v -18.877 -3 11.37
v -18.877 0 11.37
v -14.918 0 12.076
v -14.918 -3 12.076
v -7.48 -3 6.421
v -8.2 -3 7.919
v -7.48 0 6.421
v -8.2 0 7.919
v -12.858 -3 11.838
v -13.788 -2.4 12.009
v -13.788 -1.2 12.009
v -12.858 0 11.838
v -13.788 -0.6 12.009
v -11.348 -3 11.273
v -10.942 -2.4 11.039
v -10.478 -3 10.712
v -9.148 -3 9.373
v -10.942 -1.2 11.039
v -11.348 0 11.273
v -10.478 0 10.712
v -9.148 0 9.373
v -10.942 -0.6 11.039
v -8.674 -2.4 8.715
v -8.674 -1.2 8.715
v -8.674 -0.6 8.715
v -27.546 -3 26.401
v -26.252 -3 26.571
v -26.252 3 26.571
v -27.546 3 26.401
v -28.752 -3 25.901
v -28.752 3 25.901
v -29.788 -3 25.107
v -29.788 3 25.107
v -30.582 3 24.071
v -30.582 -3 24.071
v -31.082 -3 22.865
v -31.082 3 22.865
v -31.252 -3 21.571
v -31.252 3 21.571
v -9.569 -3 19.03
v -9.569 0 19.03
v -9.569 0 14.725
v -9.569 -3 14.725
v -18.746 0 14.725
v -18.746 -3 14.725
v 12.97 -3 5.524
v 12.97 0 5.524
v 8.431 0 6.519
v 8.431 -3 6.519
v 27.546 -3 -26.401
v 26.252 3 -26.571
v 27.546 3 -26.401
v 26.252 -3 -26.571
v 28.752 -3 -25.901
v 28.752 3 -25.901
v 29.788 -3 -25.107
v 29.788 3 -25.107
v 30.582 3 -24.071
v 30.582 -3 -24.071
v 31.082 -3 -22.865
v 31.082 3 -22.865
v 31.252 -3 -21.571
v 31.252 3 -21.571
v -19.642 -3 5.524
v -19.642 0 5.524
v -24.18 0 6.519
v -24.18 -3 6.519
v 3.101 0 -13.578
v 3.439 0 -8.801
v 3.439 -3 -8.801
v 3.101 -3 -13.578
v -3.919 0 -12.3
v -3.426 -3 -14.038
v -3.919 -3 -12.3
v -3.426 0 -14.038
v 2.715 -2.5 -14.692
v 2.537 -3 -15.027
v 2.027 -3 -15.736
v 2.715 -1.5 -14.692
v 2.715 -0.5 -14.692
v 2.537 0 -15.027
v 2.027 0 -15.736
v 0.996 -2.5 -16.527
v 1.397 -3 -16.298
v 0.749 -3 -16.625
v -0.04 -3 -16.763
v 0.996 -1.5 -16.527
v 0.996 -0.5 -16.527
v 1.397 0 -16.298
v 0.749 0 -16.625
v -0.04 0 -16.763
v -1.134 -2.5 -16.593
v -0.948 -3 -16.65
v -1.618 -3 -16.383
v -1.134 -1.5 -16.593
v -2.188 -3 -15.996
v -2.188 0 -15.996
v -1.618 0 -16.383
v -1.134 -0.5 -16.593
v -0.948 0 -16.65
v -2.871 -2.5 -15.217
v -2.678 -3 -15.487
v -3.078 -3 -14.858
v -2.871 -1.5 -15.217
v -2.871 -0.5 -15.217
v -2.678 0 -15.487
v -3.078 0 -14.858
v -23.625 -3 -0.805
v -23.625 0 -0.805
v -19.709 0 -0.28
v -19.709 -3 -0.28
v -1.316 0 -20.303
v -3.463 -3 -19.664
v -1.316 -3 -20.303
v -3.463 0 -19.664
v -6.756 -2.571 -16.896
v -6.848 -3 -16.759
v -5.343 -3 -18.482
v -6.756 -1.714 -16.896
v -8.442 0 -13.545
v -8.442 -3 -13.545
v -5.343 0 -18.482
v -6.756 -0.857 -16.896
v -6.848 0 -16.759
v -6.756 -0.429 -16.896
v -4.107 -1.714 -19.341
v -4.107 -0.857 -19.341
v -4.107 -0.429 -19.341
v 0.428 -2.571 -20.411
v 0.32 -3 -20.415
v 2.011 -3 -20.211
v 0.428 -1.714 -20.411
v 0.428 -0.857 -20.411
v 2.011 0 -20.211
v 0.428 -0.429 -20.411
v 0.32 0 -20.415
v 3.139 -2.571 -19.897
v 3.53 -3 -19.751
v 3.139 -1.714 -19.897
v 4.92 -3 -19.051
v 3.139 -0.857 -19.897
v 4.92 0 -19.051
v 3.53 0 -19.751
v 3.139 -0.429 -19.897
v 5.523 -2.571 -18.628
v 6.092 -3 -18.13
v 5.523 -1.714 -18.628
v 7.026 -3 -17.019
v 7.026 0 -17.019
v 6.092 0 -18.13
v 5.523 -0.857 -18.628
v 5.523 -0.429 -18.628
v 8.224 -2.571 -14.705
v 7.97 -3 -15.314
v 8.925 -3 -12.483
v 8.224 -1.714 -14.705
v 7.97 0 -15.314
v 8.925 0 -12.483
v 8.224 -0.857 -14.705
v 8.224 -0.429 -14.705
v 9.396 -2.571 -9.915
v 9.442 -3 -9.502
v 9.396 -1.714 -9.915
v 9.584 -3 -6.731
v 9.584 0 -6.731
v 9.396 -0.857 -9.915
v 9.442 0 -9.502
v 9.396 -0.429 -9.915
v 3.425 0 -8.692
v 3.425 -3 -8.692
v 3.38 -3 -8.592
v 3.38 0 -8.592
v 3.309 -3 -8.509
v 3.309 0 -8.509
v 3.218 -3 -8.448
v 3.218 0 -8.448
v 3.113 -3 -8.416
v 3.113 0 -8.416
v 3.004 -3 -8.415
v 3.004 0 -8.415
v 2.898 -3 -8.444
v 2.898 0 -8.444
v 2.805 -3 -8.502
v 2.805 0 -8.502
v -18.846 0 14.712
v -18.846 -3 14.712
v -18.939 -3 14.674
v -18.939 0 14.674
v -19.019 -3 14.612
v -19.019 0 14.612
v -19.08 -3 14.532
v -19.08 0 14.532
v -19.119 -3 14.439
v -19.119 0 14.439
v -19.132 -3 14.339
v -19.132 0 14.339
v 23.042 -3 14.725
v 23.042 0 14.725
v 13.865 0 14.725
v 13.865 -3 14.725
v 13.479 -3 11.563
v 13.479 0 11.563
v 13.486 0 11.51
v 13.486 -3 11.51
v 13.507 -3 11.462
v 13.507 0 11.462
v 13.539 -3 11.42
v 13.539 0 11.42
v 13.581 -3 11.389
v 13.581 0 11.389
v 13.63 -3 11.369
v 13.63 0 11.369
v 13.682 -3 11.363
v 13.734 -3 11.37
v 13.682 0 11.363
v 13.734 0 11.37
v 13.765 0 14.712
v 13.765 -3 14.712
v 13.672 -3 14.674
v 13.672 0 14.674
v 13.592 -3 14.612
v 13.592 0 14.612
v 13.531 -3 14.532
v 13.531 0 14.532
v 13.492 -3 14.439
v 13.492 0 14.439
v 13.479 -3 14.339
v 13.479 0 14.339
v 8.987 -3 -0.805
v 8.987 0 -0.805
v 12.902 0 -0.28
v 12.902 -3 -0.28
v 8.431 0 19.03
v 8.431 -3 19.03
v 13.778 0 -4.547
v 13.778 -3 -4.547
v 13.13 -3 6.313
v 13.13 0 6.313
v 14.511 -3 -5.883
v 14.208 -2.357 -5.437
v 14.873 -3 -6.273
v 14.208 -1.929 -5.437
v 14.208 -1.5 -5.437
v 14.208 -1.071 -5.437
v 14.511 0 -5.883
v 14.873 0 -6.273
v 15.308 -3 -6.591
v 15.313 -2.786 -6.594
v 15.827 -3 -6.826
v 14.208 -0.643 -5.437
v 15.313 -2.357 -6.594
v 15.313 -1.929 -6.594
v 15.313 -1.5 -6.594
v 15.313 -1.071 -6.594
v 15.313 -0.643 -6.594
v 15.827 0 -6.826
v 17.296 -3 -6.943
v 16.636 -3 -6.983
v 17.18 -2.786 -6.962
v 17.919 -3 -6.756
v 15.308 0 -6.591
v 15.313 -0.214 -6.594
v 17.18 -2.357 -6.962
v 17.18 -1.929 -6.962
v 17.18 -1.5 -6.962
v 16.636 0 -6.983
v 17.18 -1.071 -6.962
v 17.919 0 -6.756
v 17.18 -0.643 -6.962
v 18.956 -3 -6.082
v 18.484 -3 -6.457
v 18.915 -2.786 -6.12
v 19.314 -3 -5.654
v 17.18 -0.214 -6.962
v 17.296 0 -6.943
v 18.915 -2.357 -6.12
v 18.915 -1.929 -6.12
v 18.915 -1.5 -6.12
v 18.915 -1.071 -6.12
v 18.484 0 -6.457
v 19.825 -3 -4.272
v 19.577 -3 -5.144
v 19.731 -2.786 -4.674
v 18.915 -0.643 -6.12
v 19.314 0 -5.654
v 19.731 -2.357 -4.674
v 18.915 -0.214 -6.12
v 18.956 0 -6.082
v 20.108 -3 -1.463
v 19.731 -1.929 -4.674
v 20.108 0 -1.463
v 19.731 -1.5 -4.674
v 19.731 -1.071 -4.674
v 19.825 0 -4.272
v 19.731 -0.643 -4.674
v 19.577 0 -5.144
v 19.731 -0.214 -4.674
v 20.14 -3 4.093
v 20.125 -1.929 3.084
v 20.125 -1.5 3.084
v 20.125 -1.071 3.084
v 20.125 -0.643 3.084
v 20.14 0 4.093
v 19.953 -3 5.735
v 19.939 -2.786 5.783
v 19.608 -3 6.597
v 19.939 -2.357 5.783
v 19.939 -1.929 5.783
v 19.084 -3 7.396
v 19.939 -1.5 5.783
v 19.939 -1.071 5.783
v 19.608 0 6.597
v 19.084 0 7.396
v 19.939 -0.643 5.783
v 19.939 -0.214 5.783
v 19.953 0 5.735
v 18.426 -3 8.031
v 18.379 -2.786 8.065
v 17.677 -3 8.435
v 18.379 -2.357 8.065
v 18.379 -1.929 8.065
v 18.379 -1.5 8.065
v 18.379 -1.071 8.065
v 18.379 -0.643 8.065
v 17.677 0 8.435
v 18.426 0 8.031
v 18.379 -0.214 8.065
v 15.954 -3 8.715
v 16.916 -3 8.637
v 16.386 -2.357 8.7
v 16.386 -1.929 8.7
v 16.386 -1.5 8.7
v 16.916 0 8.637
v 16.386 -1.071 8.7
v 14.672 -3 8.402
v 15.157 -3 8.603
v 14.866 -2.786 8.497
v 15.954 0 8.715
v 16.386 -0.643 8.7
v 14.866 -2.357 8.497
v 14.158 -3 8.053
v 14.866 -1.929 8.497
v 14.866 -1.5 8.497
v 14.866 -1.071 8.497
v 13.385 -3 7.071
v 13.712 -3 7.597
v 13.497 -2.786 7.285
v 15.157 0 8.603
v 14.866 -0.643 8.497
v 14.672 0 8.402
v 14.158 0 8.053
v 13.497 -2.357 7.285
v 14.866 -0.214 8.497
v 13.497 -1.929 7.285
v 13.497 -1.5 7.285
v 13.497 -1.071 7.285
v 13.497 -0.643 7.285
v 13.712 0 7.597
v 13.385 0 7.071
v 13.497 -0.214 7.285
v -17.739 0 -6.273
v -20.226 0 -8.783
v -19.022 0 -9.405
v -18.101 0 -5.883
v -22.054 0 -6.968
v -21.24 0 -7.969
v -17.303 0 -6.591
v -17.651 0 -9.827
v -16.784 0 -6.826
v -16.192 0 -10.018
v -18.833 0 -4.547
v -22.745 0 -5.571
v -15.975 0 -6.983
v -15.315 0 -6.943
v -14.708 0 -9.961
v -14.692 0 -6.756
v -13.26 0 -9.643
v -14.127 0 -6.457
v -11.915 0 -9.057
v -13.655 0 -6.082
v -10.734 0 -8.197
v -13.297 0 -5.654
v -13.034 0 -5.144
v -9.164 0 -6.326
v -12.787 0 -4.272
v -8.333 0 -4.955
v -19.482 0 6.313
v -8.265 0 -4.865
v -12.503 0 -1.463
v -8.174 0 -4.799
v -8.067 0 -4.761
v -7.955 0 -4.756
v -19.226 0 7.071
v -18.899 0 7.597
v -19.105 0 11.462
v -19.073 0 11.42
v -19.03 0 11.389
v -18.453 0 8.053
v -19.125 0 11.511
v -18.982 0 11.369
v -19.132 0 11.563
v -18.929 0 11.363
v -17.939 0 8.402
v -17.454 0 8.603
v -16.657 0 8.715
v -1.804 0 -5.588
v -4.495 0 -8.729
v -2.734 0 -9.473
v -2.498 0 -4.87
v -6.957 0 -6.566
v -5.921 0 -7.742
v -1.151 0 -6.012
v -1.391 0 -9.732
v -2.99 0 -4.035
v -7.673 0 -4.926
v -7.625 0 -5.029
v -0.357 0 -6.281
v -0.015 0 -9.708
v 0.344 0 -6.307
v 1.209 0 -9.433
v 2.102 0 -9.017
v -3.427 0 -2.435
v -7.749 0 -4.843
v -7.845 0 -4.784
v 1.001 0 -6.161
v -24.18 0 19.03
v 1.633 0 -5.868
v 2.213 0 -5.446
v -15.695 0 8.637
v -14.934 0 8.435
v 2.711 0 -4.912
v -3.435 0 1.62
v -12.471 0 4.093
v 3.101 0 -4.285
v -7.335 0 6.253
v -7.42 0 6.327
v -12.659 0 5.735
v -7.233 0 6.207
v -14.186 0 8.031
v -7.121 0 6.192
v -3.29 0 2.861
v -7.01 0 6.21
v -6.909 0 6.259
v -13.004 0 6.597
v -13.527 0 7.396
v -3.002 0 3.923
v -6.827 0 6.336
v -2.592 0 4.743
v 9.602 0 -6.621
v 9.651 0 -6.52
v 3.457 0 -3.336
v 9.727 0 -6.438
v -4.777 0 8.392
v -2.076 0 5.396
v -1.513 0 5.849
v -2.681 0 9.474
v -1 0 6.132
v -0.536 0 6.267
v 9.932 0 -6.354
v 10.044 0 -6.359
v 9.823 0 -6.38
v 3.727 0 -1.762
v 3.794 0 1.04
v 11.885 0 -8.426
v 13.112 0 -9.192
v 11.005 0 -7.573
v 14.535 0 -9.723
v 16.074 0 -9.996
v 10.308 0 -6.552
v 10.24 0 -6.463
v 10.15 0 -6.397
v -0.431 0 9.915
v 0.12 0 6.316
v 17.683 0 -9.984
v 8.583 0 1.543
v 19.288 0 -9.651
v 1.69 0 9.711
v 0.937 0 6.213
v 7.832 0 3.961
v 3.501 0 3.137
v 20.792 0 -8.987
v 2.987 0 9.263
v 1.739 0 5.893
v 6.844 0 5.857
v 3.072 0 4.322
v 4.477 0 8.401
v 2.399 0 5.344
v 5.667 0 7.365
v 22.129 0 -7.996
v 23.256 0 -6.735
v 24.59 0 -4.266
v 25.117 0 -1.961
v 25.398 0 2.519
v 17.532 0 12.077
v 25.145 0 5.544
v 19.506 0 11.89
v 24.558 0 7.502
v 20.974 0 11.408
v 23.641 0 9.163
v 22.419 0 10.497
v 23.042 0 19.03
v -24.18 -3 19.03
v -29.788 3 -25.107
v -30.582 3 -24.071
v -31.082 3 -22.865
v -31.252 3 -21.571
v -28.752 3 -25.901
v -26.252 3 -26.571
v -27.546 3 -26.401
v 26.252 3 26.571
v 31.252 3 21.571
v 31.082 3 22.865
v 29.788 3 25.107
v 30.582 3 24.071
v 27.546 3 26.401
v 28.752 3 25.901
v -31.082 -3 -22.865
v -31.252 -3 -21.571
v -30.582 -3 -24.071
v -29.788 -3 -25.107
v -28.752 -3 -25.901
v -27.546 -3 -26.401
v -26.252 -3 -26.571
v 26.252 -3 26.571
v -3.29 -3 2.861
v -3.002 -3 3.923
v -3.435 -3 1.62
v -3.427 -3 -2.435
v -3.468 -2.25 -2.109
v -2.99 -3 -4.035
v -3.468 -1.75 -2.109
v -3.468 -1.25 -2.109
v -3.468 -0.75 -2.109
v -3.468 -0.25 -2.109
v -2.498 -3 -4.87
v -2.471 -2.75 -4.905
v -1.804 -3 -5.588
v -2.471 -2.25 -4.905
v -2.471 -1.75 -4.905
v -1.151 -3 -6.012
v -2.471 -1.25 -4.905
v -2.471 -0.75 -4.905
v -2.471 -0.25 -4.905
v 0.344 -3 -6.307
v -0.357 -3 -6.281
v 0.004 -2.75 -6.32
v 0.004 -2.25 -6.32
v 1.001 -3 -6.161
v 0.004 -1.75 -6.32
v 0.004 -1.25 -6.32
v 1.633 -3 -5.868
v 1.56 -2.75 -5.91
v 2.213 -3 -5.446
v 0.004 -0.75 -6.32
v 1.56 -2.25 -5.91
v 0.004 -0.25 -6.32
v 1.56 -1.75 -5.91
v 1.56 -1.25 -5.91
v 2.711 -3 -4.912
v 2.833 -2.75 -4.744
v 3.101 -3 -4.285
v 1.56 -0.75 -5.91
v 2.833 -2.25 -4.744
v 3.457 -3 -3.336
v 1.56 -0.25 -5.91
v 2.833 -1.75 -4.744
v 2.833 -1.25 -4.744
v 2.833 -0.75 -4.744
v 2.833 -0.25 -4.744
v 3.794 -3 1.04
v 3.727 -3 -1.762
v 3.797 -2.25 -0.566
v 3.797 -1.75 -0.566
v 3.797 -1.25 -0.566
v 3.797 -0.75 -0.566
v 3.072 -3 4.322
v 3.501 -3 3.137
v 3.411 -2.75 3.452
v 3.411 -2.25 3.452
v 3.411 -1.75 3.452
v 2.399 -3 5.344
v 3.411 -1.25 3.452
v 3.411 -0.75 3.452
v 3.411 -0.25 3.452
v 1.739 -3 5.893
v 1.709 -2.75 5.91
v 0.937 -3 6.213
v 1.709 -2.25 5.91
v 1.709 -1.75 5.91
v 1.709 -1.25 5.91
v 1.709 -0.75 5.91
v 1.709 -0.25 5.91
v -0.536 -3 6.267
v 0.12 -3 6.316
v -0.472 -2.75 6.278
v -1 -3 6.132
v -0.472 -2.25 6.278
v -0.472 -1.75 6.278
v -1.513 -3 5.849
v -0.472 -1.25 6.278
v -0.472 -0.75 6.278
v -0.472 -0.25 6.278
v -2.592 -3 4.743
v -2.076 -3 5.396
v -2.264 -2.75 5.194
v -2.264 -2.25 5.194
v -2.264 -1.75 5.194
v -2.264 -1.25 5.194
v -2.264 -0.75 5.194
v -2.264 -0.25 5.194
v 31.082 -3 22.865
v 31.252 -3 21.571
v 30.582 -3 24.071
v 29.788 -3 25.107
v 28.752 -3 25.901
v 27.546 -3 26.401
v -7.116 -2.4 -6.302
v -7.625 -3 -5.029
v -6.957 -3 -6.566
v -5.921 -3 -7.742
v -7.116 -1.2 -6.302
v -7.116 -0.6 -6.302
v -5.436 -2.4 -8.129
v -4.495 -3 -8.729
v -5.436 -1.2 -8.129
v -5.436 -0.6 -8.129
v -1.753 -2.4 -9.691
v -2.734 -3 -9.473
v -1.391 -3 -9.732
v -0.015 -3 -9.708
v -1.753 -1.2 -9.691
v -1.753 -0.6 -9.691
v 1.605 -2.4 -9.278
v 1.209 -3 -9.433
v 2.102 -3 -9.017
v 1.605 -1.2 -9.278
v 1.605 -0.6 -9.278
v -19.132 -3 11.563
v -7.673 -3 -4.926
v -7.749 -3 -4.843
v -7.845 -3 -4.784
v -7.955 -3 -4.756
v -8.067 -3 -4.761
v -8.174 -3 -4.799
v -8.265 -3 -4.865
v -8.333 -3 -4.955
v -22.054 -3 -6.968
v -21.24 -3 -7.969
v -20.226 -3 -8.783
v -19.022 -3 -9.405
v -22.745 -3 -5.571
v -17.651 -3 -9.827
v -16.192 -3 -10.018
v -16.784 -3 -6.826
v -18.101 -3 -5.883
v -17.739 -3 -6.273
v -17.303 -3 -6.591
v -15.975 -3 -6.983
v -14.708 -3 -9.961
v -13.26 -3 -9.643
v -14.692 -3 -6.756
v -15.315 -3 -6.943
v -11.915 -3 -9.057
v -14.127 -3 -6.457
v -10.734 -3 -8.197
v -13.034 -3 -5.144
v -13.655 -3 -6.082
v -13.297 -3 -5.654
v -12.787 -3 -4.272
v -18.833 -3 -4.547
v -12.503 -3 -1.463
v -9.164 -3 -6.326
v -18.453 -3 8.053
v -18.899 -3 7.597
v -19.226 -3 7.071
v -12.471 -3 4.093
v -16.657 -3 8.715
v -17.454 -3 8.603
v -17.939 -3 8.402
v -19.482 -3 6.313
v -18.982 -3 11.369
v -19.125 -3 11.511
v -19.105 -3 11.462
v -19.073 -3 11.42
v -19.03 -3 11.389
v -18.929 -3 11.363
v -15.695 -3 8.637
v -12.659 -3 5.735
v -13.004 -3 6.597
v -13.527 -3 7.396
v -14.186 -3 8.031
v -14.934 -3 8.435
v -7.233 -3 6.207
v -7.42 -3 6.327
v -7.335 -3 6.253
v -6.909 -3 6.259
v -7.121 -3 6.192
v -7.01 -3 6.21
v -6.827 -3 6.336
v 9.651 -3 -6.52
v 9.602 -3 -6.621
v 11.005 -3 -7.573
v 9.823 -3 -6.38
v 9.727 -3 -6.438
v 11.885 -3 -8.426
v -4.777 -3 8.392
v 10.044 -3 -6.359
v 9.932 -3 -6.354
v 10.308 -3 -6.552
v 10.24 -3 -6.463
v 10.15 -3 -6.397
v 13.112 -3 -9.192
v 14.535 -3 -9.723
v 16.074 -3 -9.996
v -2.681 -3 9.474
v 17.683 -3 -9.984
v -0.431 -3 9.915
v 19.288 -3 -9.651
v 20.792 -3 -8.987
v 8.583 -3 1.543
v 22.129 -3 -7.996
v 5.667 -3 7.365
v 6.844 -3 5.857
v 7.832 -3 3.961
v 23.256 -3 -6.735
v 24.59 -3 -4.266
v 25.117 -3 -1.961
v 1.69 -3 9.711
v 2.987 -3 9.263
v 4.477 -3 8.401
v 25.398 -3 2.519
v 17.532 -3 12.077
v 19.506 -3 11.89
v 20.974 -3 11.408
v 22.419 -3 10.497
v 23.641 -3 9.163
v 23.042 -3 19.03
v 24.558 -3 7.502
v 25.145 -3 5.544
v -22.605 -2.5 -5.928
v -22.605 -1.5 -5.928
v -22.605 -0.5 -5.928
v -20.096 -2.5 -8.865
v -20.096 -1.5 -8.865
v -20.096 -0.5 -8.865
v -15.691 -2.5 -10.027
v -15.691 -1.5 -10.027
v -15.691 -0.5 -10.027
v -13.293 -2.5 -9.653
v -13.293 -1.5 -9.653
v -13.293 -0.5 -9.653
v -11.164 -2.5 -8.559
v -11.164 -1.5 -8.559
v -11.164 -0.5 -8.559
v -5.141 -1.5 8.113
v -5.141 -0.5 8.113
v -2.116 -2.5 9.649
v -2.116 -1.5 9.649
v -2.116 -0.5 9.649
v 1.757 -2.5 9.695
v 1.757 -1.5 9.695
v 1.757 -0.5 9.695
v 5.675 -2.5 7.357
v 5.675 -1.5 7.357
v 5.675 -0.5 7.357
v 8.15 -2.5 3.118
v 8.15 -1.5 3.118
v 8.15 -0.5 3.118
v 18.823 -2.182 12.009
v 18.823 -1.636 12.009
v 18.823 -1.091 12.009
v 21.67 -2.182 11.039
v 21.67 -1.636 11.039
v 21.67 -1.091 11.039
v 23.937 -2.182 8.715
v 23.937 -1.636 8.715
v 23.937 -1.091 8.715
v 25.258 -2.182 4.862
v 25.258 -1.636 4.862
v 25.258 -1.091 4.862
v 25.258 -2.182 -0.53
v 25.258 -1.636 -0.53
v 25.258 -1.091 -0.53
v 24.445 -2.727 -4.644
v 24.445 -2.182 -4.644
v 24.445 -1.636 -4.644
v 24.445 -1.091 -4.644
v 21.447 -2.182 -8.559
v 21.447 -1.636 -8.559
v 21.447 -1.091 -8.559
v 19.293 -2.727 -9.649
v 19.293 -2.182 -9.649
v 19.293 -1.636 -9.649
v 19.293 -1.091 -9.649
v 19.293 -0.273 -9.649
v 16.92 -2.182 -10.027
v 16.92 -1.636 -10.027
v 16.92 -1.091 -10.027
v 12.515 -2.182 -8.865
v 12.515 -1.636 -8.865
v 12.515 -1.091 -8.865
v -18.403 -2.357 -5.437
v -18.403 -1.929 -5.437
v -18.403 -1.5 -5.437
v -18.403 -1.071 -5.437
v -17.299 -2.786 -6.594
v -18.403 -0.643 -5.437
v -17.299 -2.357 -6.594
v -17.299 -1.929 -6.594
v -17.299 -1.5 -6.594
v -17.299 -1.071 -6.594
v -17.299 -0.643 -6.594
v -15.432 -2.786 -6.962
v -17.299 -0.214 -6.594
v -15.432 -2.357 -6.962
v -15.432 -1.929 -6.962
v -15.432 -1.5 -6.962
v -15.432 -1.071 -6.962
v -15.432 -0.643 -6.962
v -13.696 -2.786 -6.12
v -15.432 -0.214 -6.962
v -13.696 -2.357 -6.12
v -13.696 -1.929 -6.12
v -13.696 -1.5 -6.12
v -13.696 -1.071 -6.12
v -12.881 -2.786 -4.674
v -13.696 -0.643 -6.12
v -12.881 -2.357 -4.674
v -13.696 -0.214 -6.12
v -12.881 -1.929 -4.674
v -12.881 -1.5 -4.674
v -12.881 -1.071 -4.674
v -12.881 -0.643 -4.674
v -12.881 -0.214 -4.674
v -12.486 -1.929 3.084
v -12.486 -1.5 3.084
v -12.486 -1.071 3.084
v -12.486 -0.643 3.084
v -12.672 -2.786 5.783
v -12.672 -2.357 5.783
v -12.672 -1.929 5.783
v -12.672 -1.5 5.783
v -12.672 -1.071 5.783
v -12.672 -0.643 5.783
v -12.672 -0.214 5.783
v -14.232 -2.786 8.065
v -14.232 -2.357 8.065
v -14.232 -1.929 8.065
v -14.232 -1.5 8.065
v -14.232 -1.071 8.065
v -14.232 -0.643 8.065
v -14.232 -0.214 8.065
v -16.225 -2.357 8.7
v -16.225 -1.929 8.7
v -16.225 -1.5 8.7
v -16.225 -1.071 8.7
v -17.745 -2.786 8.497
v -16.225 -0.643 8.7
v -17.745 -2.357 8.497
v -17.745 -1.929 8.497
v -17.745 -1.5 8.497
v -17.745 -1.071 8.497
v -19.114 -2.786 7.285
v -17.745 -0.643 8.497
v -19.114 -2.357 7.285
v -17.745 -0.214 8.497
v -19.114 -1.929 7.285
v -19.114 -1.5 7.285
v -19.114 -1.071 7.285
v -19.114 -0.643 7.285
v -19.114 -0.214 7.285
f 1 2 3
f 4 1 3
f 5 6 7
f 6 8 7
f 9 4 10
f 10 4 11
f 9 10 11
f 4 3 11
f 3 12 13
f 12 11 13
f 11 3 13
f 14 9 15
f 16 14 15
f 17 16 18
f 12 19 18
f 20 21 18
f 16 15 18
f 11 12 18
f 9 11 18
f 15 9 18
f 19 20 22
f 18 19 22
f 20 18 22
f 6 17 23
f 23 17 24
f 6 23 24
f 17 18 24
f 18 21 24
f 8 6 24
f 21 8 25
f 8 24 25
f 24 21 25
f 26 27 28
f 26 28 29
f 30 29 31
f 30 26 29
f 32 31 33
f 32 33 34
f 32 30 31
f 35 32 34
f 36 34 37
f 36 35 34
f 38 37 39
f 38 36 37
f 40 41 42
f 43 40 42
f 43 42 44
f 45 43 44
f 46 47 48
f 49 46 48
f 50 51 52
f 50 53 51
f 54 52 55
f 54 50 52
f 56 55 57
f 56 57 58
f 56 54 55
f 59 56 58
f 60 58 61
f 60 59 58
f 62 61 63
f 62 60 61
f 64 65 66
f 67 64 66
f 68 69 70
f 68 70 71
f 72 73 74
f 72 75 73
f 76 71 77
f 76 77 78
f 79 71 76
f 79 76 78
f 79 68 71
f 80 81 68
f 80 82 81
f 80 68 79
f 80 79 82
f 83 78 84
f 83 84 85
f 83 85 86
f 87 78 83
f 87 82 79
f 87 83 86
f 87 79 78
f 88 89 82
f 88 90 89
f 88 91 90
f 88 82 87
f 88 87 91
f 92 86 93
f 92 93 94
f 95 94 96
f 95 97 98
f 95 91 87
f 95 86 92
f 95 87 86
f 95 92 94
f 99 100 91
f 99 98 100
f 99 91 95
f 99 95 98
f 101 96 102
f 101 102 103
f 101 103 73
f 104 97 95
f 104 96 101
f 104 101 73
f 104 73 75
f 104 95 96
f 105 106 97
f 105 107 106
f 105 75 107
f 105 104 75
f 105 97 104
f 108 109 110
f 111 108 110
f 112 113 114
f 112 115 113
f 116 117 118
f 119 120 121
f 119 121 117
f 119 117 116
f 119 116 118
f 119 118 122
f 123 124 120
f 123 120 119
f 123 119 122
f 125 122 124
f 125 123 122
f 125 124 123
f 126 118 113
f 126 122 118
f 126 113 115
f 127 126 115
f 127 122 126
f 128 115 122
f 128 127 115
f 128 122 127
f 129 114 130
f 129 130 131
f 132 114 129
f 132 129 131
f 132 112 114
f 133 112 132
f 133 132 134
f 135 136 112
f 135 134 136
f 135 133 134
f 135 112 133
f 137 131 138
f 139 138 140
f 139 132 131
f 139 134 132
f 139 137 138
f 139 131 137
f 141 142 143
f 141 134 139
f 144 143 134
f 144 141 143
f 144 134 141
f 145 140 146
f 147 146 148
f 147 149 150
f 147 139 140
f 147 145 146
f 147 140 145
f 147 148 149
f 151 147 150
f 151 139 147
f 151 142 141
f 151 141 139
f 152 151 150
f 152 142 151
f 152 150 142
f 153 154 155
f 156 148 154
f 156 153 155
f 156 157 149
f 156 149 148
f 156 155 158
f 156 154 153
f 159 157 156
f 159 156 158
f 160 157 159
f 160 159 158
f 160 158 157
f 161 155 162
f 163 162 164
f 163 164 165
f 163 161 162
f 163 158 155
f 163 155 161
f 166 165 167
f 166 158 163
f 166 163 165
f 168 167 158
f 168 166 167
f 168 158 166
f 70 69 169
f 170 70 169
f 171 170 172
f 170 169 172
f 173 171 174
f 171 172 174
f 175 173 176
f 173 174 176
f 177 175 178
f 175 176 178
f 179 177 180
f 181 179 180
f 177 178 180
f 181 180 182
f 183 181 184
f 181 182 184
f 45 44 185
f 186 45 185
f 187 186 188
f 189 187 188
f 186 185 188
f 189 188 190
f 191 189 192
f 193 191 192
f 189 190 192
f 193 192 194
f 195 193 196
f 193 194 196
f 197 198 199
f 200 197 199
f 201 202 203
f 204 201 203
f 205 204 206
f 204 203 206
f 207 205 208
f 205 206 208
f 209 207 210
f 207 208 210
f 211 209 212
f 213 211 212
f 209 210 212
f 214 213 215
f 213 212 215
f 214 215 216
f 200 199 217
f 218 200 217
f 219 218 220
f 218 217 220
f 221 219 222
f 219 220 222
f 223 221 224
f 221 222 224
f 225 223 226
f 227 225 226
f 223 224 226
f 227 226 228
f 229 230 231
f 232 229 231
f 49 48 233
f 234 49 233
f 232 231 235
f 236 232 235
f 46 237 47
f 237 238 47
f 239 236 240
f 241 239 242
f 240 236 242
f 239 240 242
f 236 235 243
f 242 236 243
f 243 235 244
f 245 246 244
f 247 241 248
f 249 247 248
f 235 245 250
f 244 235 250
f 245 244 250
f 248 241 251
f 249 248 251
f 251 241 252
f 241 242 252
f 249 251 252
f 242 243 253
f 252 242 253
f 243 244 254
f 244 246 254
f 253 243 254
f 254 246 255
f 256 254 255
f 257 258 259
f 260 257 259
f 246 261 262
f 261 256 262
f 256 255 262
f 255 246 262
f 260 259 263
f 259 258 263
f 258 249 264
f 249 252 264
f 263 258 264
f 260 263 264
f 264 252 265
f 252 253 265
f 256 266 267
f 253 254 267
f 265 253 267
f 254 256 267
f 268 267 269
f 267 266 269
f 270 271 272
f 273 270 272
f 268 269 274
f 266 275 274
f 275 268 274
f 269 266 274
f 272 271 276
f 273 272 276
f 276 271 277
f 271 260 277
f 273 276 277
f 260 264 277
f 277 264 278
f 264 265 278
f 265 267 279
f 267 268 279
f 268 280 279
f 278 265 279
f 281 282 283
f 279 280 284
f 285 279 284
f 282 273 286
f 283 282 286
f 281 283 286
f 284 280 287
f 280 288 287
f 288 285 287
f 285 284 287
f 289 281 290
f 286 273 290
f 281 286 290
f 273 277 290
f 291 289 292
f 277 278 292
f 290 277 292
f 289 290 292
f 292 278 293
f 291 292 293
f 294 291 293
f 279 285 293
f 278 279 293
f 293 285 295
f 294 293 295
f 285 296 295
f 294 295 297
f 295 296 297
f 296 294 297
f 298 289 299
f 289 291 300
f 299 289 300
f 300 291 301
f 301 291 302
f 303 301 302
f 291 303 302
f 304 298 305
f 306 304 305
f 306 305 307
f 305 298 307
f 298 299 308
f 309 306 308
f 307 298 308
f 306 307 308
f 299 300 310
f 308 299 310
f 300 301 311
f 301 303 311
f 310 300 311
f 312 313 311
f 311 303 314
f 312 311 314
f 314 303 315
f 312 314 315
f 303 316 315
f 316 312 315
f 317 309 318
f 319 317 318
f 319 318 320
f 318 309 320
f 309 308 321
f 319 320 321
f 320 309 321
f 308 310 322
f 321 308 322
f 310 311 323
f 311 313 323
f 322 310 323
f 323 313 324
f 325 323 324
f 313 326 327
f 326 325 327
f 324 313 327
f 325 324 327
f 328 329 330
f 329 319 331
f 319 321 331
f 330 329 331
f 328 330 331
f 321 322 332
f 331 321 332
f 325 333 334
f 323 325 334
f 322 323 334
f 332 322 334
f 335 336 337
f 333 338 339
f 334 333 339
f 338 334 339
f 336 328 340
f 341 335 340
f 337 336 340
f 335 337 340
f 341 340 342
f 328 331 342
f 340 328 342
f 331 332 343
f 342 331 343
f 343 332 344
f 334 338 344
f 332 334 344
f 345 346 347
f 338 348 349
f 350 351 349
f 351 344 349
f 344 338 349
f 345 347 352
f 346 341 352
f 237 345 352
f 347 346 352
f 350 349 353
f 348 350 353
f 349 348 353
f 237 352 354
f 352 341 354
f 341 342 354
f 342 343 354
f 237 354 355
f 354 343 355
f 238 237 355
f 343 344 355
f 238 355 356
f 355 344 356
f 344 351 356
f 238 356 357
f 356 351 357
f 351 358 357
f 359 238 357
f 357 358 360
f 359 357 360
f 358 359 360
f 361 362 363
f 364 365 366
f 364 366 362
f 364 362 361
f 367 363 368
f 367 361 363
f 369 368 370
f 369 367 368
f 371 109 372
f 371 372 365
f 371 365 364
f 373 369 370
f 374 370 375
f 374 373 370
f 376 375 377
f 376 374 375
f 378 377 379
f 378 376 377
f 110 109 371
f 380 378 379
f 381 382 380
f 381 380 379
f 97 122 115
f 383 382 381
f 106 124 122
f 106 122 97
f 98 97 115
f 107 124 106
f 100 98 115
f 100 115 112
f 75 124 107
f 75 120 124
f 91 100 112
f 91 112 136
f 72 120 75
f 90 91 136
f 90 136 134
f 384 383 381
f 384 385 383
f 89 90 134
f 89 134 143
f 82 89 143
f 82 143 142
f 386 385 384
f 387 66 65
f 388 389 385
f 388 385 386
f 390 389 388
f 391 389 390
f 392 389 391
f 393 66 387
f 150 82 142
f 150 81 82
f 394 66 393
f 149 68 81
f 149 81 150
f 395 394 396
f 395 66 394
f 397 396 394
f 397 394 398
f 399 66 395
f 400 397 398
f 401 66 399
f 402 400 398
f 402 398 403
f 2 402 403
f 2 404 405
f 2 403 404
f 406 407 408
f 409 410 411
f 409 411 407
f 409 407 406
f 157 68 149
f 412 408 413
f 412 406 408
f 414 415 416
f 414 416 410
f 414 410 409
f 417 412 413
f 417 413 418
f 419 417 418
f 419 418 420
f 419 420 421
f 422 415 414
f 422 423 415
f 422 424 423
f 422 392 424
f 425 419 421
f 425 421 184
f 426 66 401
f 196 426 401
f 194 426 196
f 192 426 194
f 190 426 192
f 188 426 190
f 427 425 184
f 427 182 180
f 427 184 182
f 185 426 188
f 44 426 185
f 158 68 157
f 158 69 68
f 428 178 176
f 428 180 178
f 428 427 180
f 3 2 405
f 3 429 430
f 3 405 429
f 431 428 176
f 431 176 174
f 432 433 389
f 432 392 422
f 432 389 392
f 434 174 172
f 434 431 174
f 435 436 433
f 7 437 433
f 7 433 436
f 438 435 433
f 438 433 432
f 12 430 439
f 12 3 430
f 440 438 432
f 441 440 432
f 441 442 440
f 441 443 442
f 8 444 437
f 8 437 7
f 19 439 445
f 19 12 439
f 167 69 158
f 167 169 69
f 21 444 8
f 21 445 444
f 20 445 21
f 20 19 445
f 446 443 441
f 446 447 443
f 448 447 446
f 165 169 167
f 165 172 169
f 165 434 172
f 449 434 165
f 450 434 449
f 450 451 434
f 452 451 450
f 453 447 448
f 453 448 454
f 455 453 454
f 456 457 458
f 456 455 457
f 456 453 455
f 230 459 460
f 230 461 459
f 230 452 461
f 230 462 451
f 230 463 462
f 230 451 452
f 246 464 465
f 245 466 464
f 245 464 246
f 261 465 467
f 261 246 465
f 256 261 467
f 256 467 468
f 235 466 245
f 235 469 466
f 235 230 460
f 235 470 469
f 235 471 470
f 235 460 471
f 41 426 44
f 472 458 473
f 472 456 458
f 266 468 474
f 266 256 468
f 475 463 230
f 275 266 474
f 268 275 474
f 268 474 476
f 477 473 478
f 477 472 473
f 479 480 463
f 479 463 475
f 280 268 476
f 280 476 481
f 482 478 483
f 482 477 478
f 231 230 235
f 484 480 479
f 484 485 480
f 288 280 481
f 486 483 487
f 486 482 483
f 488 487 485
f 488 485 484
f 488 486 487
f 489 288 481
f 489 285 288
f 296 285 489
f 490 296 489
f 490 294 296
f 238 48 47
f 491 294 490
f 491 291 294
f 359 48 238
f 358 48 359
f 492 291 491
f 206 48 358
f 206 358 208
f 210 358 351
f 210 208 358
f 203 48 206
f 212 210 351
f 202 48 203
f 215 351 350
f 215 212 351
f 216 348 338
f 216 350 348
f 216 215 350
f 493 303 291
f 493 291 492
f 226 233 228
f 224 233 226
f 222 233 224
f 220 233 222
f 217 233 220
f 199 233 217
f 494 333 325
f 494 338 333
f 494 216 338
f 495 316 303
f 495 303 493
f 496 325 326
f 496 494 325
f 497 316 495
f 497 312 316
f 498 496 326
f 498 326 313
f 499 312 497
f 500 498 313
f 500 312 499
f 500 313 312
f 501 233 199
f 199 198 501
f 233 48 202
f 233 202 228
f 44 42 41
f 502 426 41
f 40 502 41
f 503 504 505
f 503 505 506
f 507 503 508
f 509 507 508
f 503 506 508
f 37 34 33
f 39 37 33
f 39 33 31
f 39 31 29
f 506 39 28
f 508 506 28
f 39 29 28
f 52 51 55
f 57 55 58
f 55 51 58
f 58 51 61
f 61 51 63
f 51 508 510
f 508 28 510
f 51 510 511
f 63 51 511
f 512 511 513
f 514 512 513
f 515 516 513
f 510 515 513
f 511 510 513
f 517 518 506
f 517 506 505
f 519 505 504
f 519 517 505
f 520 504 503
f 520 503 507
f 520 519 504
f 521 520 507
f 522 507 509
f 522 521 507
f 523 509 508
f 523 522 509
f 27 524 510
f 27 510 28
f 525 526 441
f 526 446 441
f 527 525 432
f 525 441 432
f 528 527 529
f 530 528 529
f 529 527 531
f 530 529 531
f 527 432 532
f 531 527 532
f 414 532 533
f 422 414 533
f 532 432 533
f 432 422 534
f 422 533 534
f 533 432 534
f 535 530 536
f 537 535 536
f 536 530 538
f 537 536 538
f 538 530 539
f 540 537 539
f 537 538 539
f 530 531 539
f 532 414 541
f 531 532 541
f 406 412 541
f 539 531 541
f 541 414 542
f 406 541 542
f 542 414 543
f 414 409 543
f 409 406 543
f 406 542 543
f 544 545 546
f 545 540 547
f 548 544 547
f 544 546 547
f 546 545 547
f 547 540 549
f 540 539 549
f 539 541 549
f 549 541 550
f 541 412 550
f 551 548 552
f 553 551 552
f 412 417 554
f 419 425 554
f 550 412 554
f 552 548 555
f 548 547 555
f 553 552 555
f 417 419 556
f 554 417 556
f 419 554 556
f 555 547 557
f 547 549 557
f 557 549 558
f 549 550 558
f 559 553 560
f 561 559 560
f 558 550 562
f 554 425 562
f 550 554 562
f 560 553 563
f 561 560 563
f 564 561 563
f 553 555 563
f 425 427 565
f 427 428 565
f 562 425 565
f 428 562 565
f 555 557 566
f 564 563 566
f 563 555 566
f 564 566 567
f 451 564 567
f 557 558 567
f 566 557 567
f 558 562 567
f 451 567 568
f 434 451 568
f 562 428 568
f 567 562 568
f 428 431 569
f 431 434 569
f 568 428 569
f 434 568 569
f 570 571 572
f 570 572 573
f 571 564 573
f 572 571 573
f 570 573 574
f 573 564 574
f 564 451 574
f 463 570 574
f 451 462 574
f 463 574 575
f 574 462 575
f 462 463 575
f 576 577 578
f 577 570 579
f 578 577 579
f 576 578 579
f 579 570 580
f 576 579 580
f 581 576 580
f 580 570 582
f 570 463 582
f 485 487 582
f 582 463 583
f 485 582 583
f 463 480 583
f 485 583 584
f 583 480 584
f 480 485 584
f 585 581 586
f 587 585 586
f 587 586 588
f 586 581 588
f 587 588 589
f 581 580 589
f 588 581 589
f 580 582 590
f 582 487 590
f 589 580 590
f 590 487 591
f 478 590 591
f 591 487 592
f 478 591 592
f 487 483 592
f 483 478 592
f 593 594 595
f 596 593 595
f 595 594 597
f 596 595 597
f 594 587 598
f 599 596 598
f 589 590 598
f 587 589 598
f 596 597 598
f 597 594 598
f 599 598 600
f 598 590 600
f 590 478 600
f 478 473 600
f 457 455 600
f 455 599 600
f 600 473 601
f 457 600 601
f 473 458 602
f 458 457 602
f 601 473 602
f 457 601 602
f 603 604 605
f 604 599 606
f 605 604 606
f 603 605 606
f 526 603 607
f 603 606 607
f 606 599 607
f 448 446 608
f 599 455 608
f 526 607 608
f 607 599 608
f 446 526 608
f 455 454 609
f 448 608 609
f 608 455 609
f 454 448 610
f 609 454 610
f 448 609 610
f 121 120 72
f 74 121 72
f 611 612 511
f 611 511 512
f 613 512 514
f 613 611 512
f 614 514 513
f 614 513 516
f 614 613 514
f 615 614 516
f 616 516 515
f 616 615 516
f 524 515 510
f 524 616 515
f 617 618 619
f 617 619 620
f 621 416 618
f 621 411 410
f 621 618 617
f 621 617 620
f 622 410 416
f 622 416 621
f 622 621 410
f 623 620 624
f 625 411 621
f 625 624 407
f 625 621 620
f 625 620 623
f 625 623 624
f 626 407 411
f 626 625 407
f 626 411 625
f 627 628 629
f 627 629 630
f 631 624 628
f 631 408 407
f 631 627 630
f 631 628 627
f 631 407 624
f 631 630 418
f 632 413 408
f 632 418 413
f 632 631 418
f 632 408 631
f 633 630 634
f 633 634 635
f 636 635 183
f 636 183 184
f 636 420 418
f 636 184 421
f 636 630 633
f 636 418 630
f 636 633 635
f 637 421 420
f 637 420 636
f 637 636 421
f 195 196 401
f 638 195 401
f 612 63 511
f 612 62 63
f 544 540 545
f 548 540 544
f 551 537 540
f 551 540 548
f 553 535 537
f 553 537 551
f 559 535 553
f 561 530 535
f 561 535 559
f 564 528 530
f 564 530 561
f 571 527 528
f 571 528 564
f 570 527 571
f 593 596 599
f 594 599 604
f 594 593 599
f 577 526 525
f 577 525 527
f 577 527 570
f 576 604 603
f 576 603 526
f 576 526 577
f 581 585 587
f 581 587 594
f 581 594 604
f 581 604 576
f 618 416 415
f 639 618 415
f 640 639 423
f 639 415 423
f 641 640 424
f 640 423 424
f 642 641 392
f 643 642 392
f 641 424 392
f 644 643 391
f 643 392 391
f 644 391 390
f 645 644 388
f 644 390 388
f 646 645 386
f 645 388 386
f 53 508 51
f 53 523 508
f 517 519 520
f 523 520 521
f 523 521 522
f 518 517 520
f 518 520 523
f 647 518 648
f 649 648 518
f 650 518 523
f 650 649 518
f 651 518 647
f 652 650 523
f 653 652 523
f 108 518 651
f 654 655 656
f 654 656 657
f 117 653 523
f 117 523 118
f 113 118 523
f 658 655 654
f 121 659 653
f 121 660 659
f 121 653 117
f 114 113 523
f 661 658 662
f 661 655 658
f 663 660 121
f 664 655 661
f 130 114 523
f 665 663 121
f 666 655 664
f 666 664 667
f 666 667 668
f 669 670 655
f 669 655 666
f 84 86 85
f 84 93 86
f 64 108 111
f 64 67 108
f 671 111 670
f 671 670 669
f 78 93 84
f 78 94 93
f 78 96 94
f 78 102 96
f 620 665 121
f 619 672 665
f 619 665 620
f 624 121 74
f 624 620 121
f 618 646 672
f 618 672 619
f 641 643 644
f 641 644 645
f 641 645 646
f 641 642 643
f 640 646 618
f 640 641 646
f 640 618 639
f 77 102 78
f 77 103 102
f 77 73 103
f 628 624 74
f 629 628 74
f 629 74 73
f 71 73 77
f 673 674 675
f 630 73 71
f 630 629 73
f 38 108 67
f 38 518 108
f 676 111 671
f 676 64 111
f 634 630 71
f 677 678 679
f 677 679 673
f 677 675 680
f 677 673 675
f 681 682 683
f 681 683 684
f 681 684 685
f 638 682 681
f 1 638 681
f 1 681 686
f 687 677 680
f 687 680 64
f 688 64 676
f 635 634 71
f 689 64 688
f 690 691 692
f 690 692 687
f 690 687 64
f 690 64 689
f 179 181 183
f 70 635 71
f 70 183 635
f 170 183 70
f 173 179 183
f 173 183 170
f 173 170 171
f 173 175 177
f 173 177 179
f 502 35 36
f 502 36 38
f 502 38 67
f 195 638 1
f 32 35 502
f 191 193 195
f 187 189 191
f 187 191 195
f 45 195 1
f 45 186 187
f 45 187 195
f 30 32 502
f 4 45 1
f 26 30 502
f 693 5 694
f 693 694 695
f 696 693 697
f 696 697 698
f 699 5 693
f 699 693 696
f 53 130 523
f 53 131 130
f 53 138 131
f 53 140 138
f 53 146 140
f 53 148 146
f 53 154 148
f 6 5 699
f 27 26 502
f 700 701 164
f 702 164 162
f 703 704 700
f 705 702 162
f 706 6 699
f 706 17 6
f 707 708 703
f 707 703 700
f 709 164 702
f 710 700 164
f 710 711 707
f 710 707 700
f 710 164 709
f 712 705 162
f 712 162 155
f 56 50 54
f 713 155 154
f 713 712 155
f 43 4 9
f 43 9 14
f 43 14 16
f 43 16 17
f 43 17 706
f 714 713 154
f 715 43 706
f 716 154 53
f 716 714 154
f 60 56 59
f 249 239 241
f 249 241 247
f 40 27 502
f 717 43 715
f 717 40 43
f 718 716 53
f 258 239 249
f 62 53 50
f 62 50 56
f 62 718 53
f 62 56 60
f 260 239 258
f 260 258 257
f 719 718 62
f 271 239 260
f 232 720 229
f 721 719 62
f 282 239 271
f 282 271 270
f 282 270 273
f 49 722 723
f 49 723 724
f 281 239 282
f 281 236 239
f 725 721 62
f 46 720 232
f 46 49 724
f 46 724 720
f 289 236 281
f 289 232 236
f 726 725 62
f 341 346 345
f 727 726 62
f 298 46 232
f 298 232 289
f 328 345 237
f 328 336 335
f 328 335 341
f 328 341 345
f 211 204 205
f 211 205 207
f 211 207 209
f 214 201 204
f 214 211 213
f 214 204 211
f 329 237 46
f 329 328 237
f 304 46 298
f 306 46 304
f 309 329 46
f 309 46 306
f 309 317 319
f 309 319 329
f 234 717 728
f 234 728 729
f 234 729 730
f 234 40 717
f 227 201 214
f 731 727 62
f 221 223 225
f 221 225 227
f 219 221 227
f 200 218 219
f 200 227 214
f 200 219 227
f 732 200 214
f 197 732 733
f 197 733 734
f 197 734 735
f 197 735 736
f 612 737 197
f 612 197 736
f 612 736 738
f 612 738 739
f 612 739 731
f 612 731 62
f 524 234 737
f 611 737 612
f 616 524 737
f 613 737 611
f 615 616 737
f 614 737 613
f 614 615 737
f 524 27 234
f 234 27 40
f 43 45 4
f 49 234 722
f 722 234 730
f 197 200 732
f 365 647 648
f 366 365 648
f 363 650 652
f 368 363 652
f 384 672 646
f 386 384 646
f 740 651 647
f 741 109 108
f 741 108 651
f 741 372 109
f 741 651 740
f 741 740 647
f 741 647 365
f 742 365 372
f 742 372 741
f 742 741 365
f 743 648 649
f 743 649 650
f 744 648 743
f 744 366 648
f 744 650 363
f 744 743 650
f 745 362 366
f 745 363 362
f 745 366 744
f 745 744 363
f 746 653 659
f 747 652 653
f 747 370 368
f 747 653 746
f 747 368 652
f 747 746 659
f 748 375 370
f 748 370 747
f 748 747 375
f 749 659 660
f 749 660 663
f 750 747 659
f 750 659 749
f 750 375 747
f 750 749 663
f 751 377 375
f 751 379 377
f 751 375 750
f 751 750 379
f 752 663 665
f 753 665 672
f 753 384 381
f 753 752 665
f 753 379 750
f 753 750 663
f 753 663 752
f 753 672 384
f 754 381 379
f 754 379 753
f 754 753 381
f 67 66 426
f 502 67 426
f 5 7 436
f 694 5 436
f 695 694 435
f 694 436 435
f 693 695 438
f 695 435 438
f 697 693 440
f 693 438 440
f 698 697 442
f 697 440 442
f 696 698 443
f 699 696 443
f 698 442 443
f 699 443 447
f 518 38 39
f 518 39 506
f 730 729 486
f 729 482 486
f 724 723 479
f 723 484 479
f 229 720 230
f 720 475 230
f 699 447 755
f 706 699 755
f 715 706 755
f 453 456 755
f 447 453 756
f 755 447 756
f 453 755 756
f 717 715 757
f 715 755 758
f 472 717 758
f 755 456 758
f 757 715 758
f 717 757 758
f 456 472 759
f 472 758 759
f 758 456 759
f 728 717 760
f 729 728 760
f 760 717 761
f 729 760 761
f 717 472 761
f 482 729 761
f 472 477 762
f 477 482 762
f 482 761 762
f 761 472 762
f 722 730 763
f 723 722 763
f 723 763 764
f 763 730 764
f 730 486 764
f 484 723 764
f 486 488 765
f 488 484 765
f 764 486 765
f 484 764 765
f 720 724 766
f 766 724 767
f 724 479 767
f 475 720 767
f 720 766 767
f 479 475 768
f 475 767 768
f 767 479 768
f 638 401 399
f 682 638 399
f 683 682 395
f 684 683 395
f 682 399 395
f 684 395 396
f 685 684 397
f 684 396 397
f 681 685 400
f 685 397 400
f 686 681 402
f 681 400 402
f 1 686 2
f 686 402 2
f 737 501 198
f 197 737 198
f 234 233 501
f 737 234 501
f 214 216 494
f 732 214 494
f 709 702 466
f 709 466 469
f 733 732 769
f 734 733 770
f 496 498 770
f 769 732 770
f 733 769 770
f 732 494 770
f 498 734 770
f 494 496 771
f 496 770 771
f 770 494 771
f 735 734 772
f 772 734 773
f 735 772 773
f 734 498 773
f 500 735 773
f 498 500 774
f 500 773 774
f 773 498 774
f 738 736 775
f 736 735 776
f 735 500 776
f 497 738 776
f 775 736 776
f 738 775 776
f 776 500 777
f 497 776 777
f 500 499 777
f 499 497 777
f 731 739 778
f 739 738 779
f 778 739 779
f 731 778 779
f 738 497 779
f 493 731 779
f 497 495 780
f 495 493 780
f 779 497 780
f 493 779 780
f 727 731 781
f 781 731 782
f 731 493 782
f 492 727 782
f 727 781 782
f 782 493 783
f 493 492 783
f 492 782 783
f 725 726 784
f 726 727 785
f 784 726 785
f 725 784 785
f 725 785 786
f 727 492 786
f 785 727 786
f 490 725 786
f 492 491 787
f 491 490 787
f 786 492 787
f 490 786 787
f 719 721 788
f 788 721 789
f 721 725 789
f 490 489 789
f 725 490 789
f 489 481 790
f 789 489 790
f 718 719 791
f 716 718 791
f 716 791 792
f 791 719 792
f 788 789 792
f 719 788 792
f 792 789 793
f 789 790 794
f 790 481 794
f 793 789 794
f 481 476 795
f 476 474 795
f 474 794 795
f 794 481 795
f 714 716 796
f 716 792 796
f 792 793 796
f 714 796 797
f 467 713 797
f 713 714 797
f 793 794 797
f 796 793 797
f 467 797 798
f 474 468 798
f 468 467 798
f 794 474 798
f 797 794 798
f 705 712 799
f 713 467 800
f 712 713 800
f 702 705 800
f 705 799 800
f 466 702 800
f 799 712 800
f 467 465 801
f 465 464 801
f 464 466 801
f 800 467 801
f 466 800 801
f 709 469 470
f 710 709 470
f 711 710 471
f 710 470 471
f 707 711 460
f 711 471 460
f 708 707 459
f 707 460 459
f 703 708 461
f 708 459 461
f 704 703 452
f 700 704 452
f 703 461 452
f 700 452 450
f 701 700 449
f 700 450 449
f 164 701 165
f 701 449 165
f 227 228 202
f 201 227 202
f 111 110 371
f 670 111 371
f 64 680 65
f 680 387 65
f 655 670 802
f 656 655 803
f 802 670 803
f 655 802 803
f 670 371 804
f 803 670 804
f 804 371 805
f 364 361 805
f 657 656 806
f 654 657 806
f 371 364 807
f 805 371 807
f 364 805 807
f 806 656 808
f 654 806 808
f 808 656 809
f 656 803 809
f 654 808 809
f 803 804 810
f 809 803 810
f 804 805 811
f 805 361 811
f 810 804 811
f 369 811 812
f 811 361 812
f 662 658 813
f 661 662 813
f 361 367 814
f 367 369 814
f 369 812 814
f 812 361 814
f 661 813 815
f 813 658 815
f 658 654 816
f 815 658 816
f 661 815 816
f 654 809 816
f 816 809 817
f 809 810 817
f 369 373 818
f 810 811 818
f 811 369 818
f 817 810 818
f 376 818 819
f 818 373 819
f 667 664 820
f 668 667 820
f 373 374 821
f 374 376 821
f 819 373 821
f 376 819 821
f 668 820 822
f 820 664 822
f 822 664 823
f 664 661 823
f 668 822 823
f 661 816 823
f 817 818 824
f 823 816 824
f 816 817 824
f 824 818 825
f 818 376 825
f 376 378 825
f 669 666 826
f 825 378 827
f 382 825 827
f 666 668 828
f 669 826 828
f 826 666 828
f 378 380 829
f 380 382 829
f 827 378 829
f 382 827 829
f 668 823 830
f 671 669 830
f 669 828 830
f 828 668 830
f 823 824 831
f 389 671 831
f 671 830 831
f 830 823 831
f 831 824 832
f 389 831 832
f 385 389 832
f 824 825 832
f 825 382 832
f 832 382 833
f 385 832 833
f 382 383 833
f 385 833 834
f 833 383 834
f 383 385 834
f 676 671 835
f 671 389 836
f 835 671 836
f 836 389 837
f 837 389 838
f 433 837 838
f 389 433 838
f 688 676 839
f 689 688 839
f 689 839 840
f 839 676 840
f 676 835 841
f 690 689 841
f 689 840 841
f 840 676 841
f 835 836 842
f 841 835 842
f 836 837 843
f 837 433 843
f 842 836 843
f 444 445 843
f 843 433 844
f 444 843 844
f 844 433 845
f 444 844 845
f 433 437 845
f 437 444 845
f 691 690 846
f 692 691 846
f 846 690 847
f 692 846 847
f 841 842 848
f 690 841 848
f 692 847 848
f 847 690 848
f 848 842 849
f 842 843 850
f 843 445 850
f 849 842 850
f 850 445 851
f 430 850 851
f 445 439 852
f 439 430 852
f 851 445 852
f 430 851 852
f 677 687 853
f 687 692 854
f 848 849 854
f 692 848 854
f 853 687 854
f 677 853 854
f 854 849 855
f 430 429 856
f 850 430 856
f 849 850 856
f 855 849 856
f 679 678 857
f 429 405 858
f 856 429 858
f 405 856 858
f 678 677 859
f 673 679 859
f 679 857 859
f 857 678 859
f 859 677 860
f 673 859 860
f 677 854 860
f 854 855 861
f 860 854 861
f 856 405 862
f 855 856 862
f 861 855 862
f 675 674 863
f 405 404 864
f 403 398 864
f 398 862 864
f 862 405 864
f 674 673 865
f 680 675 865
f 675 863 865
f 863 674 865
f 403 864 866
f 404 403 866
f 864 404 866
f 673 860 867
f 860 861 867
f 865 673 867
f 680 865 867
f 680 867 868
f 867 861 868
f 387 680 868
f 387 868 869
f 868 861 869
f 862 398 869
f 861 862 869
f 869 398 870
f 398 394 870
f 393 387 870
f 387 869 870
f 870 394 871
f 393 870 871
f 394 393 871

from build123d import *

# Parameters (mm, degrees)
F1_DEPTH = 3
F3_DEPTH = 3


with BuildPart() as f1:
    # F0 (on Front) → F1 (new body)
    with BuildSketch(Plane.XZ):
        with BuildLine():
            Line((-26.2521904707, -26.5712421387), (26.2521904707, -26.5712421387))
            ThreePointArc((26.2521904707, -26.5712421387), (29.7877243766, -25.1067760447), (31.2521904707, -21.5712421387))
            Line((31.2521904707, -21.5712421387), (31.2521904707, 21.5712421387))
            ThreePointArc((31.2521904707, 21.5712421387), (29.7877243766, 25.1067760447), (26.2521904707, 26.5712421387))
            Line((26.2521904707, 26.5712421387), (-26.2521904707, 26.5712421387))
            ThreePointArc((-26.2521904707, 26.5712421387), (-29.7877243766, 25.1067760447), (-31.2521904707, 21.5712421387))
            Line((-31.2521904707, 21.5712421387), (-31.2521904707, -21.5712421387))
            ThreePointArc((-31.2521904707, -21.5712421387), (-29.7877243766, -25.1067760447), (-26.2521904707, -26.5712421387))
        make_face()
        with BuildLine():
            Line((-24.1804867983, 6.5188668668), (-24.1804867983, 19.0295055509))
            Line((-24.1804867983, 19.0295055509), (-9.5692276955, 19.0295055509))
            Line((-9.5692276955, 19.0295055509), (-9.5692276955, 14.7253833711))
            Line((-9.5692276955, 14.7253833711), (-18.7460067018, 14.7253833711))
            ThreePointArc((-18.7460067018, 14.7253833711), (-19.0189579715, 14.6123232533), (-19.1320180893, 14.3393719836))
            Line((-19.1320180893, 14.3393719836), (-19.1320180893, 11.5628045595))
            ThreePointArc((-19.1320180893, 11.5628045595), (-19.052543922, 11.4032002875), (-18.8772828528, 11.3704401816))
            add(Edge.make_bspline(
                [(-18.8772828528, 11.3704401816), (-18.0907039553, 11.5942528357), (-16.428571119, 12.048986212), (-13.7637590064, 12.1663926481), (-10.7783023467, 11.2878918717), (-8.608008816, 8.883739189), (-7.8235892044, 7.195407339), (-7.479812433, 6.4214548917)],
                knots=[0.0187889452, 0.0187889452, 0.0187889452, 0.0187889452, 0.1928215696, 0.3859968189, 0.5892635727, 0.8004585236, 0.9781550685, 0.9781550685, 0.9781550685, 0.9781550685], degree=3))
            ThreePointArc((-7.479812433, 6.4214548917), (-7.1773938737, 6.1954394373), (-6.8268028651, 6.3355319618))
            add(Edge.make_bspline(
                [(-6.8268028651, 6.3355319618), (-6.3239368021, 6.9578108483), (-5.1657820011, 8.33523566), (-2.1396728387, 9.9326729538), (1.8950429815, 10.0853631714), (6.0194775368, 7.6605840045), (8.3949703412, 3.199174132), (8.7962173797, 0.4841619269), (8.9867115021, -0.8048042655)],
                knots=[0.0134429235, 0.0134429235, 0.0134429235, 0.0134429235, 0.1392843233, 0.2952512735, 0.4619051388, 0.6427907875, 0.8304130649, 1, 1, 1, 1], degree=3))
            Line((8.9867115021, -0.8048042655), (12.9019767046, -0.2800785005))
            add(Edge.make_bspline(
                [(12.9019767046, -0.2800785005), (13.0543244929, -1.4128068863), (13.328107964, -3.4484279333), (14.1004293769, -5.4535206804), (15.2062121625, -6.7542628508), (17.2121585921, -7.2105429933), (19.0659013385, -6.2089714944), (19.9198257488, -4.6565826928), (20.2026522486, -0.8100851133), (20.0692985967, 3.029626915), (20.2545182868, 5.7747033617), (18.5907316712, 8.3373482447), (16.4047076085, 8.7783260416), (14.8198998378, 8.6742253566), (13.28172228, 7.3709317022), (13.085235865, 6.1267789414), (12.9698067904, 5.5243223906)],
                knots=[0, 0, 0, 0, 0.0850530681, 0.1531982013, 0.2128134932, 0.2778382163, 0.3433024412, 0.4040377865, 0.4960108059, 0.5899390151, 0.6674603836, 0.7458264942, 0.8140016254, 0.8723646786, 0.9361011897, 1, 1, 1, 1], degree=3))
            Line((12.9698067904, 5.5243223906), (8.4308534861, 6.5188668668))
            Line((8.4308534861, 6.5188668668), (8.4308534861, 19.0295055509))
            Line((8.4308534861, 19.0295055509), (23.0421125889, 19.0295055509))
            Line((23.0421125889, 19.0295055509), (23.0421125889, 14.7253833711))
            Line((23.0421125889, 14.7253833711), (13.8653335825, 14.7253833711))
            ThreePointArc((13.8653335825, 14.7253833711), (13.5923823128, 14.6123232533), (13.4793221951, 14.3393719836))
            Line((13.4793221951, 14.3393719836), (13.4793221951, 11.5626012477))
            ThreePointArc((13.4793221951, 11.5626012477), (13.5587386682, 11.40304056), (13.7339183255, 11.370197343))
            add(Edge.make_bspline(
                [(13.7339183255, 11.370197343), (14.5206329081, 11.5934338311), (16.1829432155, 12.0472832886), (18.8464510581, 12.1747073507), (21.8375982381, 11.2543430537), (24.2004389296, 8.7818679608), (25.5755735256, 4.8713271716), (25.3064350862, -0.5737911857), (24.8312041176, -4.7094018545), (21.749976272, -9.0376680335), (16.9706732988, -10.4786564529), (12.5389209811, -9.3007692118), (10.8350653675, -7.5140693006), (10.3080651221, -6.5522620029)],
                knots=[0.006673314, 0.006673314, 0.006673314, 0.006673314, 0.0685294658, 0.1371846306, 0.2094263518, 0.2844857821, 0.3685608886, 0.4653028232, 0.5506041076, 0.6431140813, 0.7339975358, 0.8229147331, 0.8907000755, 0.8907000755, 0.8907000755, 0.8907000755], degree=3))
            ThreePointArc((10.3080651221, -6.5522620029), (9.8768736928, -6.3630255441), (9.583580391, -6.731421425))
            add(Edge.make_bspline(
                [(-8.4416717291, -13.5454395786), (-7.9438695099, -14.71578707), (-6.9579408758, -17.0337339557), (-4.2409263056, -19.6699254166), (0.459261844, -20.936928095), (5.9462638445, -19.1007566385), (8.4575100908, -14.8113966737), (9.4779663102, -10.267236628), (9.5666941787, -7.7613995922), (9.583580391, -6.731421425)],
                knots=[0, 0, 0, 0, 0.131573279, 0.2605891623, 0.4072468832, 0.5651074981, 0.7133867816, 0.8642572868, 0.9719474004, 0.9719474004, 0.9719474004, 0.9719474004], degree=3))
            Line((-8.4416717291, -13.5454395786), (-3.91946733, -12.3001933098))
            add(Edge.make_bspline(
                [(3.4391110044, -8.801032884), (3.4292294296, -9.8788771881), (3.3907020801, -12.0466383407), (2.98547267, -14.7224859441), (1.1638632401, -16.8474068921), (-1.2378962082, -16.8165054966), (-3.15517022, -15.3270751162), (-3.6508764536, -13.3639063953), (-3.91946733, -12.3001933098)],
                knots=[0.0310308646, 0.0310308646, 0.0310308646, 0.0310308646, 0.1949538702, 0.364973689, 0.5249423704, 0.6722147355, 0.8223945444, 1, 1, 1, 1], degree=3))
            ThreePointArc((3.4391110044, -8.801032884), (3.2178473715, -8.4483976929), (2.804982612, -8.5018005366))
            add(Edge.make_bspline(
                [(-7.6247713503, -5.0285945502), (-7.4951246028, -5.4581028515), (-7.1182427223, -6.5417591982), (-5.5143339169, -8.3435497571), (-1.8620178866, -10.0886878273), (1.4142697444, -9.5568731886), (2.461744348, -8.7898311991), (2.804982612, -8.5018005366)],
                knots=[0.0376498734, 0.0376498734, 0.0376498734, 0.0376498734, 0.1637941515, 0.3576495972, 0.6037857722, 0.8301707333, 0.9551635836, 0.9551635836, 0.9551635836, 0.9551635836], degree=3))
            ThreePointArc((-7.6247713503, -5.0285945502), (-7.954646037, -4.7561731868), (-8.3332477687, -4.9554002855))
            add(Edge.make_bspline(
                [(-23.6246287823, -0.8048042655), (-23.4238768593, -2.6360165944), (-23.0505161222, -6.0417263616), (-20.3186102891, -9.2347391659), (-15.6652683934, -10.4746071304), (-10.9657366753, -9.1109706503), (-8.8996831286, -5.9644979669), (-8.4359519706, -5.1438258987), (-8.3332477687, -4.9554002855)],
                knots=[0, 0, 0, 0, 0.1973470203, 0.3670282598, 0.5513187137, 0.7396844469, 0.9084969392, 0.9665234371, 0.9665234371, 0.9665234371, 0.9665234371], degree=3))
            Line((-23.6246287823, -0.8048042655), (-19.7093635798, -0.2800785005))
            add(Edge.make_bspline(
                [(-19.7093635798, -0.2800785005), (-19.5570157915, -1.4128068863), (-19.2832323204, -3.4484279333), (-18.5109109074, -5.4535206804), (-17.4051281218, -6.7542628508), (-15.3991816922, -7.2105429933), (-13.5454389459, -6.2089714944), (-12.6915145355, -4.6565826928), (-12.4086880358, -0.8100851133), (-12.5420416876, 3.029626915), (-12.3568219976, 5.7747033617), (-14.0206086131, 8.3373482447), (-16.2066326759, 8.7783260416), (-17.7914404465, 8.6742253566), (-19.3296180044, 7.3709317022), (-19.5261044193, 6.1267789414), (-19.641533494, 5.5243223906)],
                knots=[0, 0, 0, 0, 0.0850530681, 0.1531982013, 0.2128134932, 0.2778382163, 0.3433024412, 0.4040377865, 0.4960108059, 0.5899390151, 0.6674603836, 0.7458264942, 0.8140016254, 0.8723646786, 0.9361011897, 1, 1, 1, 1], degree=3))
            Line((-19.641533494, 5.5243223906), (-24.1804867983, 6.5188668668))
        make_face(mode=Mode.SUBTRACT)
    extrude(amount=F1_DEPTH)



with BuildPart() as f1b:
    # F0 (on Front) → F1, piece 2 (new body)
    with BuildSketch(Plane.XZ):
        with BuildLine():
            add(Edge.make_bspline(
                [(-3.4354478121, 1.6201604158), (-3.5268113996, 0.5204862984), (-3.661245232, -2.1514122715), (-2.8038980937, -5.0376153478), (-0.0082786462, -6.9479730958), (3.4625349906, -4.9889346896), (3.899180856, -0.526341138), (3.7411706941, 3.4063941992), (2.0399404478, 6.2494758513), (-0.4779286797, 6.4088353336), (-1.415072846, 5.9485227508), (-2.3566320655, 5.2360821356), (-3.2138401141, 3.6852138136), (-3.3662258173, 2.4533329967), (-3.4354478121, 1.6201604158)],
                knots=[0, 0, 0, 0, 0.1002894958, 0.1897756028, 0.2774641613, 0.3709145582, 0.478467765, 0.5828122225, 0.6726179006, 0.7498518805, 0.8019038103, 0.8568491044, 0.9240152544, 1, 1, 1, 1], degree=3))
        make_face()
    extrude(amount=F1_DEPTH)


with BuildPart() as f1_1:
    add(f1.part)

    add(f1b.part)  # F3 merges F1b
    # F2 (on face) → F3 (join)
    with BuildSketch(Plane.XZ):
        with BuildLine():
            Line((31.2521904707, -21.5712421387), (31.2521904707, 21.5712421387))
            ThreePointArc((31.2521904707, 21.5712421387), (29.7877243766, 25.1067760447), (26.2521904707, 26.5712421387))
            Line((26.2521904707, 26.5712421387), (-26.2521904707, 26.5712421387))
            ThreePointArc((-26.2521904707, 26.5712421387), (-29.7877243766, 25.1067760447), (-31.2521904707, 21.5712421387))
            Line((-31.2521904707, 21.5712421387), (-31.2521904707, -21.5712421387))
            ThreePointArc((-31.2521904707, -21.5712421387), (-29.7877243766, -25.1067760447), (-26.2521904707, -26.5712421387))
            Line((-26.2521904707, -26.5712421387), (26.2521904707, -26.5712421387))
            ThreePointArc((26.2521904707, -26.5712421387), (29.7877243766, -25.1067760447), (31.2521904707, -21.5712421387))
        make_face()
    extrude(amount=-F3_DEPTH)


solid = f1_1.part
